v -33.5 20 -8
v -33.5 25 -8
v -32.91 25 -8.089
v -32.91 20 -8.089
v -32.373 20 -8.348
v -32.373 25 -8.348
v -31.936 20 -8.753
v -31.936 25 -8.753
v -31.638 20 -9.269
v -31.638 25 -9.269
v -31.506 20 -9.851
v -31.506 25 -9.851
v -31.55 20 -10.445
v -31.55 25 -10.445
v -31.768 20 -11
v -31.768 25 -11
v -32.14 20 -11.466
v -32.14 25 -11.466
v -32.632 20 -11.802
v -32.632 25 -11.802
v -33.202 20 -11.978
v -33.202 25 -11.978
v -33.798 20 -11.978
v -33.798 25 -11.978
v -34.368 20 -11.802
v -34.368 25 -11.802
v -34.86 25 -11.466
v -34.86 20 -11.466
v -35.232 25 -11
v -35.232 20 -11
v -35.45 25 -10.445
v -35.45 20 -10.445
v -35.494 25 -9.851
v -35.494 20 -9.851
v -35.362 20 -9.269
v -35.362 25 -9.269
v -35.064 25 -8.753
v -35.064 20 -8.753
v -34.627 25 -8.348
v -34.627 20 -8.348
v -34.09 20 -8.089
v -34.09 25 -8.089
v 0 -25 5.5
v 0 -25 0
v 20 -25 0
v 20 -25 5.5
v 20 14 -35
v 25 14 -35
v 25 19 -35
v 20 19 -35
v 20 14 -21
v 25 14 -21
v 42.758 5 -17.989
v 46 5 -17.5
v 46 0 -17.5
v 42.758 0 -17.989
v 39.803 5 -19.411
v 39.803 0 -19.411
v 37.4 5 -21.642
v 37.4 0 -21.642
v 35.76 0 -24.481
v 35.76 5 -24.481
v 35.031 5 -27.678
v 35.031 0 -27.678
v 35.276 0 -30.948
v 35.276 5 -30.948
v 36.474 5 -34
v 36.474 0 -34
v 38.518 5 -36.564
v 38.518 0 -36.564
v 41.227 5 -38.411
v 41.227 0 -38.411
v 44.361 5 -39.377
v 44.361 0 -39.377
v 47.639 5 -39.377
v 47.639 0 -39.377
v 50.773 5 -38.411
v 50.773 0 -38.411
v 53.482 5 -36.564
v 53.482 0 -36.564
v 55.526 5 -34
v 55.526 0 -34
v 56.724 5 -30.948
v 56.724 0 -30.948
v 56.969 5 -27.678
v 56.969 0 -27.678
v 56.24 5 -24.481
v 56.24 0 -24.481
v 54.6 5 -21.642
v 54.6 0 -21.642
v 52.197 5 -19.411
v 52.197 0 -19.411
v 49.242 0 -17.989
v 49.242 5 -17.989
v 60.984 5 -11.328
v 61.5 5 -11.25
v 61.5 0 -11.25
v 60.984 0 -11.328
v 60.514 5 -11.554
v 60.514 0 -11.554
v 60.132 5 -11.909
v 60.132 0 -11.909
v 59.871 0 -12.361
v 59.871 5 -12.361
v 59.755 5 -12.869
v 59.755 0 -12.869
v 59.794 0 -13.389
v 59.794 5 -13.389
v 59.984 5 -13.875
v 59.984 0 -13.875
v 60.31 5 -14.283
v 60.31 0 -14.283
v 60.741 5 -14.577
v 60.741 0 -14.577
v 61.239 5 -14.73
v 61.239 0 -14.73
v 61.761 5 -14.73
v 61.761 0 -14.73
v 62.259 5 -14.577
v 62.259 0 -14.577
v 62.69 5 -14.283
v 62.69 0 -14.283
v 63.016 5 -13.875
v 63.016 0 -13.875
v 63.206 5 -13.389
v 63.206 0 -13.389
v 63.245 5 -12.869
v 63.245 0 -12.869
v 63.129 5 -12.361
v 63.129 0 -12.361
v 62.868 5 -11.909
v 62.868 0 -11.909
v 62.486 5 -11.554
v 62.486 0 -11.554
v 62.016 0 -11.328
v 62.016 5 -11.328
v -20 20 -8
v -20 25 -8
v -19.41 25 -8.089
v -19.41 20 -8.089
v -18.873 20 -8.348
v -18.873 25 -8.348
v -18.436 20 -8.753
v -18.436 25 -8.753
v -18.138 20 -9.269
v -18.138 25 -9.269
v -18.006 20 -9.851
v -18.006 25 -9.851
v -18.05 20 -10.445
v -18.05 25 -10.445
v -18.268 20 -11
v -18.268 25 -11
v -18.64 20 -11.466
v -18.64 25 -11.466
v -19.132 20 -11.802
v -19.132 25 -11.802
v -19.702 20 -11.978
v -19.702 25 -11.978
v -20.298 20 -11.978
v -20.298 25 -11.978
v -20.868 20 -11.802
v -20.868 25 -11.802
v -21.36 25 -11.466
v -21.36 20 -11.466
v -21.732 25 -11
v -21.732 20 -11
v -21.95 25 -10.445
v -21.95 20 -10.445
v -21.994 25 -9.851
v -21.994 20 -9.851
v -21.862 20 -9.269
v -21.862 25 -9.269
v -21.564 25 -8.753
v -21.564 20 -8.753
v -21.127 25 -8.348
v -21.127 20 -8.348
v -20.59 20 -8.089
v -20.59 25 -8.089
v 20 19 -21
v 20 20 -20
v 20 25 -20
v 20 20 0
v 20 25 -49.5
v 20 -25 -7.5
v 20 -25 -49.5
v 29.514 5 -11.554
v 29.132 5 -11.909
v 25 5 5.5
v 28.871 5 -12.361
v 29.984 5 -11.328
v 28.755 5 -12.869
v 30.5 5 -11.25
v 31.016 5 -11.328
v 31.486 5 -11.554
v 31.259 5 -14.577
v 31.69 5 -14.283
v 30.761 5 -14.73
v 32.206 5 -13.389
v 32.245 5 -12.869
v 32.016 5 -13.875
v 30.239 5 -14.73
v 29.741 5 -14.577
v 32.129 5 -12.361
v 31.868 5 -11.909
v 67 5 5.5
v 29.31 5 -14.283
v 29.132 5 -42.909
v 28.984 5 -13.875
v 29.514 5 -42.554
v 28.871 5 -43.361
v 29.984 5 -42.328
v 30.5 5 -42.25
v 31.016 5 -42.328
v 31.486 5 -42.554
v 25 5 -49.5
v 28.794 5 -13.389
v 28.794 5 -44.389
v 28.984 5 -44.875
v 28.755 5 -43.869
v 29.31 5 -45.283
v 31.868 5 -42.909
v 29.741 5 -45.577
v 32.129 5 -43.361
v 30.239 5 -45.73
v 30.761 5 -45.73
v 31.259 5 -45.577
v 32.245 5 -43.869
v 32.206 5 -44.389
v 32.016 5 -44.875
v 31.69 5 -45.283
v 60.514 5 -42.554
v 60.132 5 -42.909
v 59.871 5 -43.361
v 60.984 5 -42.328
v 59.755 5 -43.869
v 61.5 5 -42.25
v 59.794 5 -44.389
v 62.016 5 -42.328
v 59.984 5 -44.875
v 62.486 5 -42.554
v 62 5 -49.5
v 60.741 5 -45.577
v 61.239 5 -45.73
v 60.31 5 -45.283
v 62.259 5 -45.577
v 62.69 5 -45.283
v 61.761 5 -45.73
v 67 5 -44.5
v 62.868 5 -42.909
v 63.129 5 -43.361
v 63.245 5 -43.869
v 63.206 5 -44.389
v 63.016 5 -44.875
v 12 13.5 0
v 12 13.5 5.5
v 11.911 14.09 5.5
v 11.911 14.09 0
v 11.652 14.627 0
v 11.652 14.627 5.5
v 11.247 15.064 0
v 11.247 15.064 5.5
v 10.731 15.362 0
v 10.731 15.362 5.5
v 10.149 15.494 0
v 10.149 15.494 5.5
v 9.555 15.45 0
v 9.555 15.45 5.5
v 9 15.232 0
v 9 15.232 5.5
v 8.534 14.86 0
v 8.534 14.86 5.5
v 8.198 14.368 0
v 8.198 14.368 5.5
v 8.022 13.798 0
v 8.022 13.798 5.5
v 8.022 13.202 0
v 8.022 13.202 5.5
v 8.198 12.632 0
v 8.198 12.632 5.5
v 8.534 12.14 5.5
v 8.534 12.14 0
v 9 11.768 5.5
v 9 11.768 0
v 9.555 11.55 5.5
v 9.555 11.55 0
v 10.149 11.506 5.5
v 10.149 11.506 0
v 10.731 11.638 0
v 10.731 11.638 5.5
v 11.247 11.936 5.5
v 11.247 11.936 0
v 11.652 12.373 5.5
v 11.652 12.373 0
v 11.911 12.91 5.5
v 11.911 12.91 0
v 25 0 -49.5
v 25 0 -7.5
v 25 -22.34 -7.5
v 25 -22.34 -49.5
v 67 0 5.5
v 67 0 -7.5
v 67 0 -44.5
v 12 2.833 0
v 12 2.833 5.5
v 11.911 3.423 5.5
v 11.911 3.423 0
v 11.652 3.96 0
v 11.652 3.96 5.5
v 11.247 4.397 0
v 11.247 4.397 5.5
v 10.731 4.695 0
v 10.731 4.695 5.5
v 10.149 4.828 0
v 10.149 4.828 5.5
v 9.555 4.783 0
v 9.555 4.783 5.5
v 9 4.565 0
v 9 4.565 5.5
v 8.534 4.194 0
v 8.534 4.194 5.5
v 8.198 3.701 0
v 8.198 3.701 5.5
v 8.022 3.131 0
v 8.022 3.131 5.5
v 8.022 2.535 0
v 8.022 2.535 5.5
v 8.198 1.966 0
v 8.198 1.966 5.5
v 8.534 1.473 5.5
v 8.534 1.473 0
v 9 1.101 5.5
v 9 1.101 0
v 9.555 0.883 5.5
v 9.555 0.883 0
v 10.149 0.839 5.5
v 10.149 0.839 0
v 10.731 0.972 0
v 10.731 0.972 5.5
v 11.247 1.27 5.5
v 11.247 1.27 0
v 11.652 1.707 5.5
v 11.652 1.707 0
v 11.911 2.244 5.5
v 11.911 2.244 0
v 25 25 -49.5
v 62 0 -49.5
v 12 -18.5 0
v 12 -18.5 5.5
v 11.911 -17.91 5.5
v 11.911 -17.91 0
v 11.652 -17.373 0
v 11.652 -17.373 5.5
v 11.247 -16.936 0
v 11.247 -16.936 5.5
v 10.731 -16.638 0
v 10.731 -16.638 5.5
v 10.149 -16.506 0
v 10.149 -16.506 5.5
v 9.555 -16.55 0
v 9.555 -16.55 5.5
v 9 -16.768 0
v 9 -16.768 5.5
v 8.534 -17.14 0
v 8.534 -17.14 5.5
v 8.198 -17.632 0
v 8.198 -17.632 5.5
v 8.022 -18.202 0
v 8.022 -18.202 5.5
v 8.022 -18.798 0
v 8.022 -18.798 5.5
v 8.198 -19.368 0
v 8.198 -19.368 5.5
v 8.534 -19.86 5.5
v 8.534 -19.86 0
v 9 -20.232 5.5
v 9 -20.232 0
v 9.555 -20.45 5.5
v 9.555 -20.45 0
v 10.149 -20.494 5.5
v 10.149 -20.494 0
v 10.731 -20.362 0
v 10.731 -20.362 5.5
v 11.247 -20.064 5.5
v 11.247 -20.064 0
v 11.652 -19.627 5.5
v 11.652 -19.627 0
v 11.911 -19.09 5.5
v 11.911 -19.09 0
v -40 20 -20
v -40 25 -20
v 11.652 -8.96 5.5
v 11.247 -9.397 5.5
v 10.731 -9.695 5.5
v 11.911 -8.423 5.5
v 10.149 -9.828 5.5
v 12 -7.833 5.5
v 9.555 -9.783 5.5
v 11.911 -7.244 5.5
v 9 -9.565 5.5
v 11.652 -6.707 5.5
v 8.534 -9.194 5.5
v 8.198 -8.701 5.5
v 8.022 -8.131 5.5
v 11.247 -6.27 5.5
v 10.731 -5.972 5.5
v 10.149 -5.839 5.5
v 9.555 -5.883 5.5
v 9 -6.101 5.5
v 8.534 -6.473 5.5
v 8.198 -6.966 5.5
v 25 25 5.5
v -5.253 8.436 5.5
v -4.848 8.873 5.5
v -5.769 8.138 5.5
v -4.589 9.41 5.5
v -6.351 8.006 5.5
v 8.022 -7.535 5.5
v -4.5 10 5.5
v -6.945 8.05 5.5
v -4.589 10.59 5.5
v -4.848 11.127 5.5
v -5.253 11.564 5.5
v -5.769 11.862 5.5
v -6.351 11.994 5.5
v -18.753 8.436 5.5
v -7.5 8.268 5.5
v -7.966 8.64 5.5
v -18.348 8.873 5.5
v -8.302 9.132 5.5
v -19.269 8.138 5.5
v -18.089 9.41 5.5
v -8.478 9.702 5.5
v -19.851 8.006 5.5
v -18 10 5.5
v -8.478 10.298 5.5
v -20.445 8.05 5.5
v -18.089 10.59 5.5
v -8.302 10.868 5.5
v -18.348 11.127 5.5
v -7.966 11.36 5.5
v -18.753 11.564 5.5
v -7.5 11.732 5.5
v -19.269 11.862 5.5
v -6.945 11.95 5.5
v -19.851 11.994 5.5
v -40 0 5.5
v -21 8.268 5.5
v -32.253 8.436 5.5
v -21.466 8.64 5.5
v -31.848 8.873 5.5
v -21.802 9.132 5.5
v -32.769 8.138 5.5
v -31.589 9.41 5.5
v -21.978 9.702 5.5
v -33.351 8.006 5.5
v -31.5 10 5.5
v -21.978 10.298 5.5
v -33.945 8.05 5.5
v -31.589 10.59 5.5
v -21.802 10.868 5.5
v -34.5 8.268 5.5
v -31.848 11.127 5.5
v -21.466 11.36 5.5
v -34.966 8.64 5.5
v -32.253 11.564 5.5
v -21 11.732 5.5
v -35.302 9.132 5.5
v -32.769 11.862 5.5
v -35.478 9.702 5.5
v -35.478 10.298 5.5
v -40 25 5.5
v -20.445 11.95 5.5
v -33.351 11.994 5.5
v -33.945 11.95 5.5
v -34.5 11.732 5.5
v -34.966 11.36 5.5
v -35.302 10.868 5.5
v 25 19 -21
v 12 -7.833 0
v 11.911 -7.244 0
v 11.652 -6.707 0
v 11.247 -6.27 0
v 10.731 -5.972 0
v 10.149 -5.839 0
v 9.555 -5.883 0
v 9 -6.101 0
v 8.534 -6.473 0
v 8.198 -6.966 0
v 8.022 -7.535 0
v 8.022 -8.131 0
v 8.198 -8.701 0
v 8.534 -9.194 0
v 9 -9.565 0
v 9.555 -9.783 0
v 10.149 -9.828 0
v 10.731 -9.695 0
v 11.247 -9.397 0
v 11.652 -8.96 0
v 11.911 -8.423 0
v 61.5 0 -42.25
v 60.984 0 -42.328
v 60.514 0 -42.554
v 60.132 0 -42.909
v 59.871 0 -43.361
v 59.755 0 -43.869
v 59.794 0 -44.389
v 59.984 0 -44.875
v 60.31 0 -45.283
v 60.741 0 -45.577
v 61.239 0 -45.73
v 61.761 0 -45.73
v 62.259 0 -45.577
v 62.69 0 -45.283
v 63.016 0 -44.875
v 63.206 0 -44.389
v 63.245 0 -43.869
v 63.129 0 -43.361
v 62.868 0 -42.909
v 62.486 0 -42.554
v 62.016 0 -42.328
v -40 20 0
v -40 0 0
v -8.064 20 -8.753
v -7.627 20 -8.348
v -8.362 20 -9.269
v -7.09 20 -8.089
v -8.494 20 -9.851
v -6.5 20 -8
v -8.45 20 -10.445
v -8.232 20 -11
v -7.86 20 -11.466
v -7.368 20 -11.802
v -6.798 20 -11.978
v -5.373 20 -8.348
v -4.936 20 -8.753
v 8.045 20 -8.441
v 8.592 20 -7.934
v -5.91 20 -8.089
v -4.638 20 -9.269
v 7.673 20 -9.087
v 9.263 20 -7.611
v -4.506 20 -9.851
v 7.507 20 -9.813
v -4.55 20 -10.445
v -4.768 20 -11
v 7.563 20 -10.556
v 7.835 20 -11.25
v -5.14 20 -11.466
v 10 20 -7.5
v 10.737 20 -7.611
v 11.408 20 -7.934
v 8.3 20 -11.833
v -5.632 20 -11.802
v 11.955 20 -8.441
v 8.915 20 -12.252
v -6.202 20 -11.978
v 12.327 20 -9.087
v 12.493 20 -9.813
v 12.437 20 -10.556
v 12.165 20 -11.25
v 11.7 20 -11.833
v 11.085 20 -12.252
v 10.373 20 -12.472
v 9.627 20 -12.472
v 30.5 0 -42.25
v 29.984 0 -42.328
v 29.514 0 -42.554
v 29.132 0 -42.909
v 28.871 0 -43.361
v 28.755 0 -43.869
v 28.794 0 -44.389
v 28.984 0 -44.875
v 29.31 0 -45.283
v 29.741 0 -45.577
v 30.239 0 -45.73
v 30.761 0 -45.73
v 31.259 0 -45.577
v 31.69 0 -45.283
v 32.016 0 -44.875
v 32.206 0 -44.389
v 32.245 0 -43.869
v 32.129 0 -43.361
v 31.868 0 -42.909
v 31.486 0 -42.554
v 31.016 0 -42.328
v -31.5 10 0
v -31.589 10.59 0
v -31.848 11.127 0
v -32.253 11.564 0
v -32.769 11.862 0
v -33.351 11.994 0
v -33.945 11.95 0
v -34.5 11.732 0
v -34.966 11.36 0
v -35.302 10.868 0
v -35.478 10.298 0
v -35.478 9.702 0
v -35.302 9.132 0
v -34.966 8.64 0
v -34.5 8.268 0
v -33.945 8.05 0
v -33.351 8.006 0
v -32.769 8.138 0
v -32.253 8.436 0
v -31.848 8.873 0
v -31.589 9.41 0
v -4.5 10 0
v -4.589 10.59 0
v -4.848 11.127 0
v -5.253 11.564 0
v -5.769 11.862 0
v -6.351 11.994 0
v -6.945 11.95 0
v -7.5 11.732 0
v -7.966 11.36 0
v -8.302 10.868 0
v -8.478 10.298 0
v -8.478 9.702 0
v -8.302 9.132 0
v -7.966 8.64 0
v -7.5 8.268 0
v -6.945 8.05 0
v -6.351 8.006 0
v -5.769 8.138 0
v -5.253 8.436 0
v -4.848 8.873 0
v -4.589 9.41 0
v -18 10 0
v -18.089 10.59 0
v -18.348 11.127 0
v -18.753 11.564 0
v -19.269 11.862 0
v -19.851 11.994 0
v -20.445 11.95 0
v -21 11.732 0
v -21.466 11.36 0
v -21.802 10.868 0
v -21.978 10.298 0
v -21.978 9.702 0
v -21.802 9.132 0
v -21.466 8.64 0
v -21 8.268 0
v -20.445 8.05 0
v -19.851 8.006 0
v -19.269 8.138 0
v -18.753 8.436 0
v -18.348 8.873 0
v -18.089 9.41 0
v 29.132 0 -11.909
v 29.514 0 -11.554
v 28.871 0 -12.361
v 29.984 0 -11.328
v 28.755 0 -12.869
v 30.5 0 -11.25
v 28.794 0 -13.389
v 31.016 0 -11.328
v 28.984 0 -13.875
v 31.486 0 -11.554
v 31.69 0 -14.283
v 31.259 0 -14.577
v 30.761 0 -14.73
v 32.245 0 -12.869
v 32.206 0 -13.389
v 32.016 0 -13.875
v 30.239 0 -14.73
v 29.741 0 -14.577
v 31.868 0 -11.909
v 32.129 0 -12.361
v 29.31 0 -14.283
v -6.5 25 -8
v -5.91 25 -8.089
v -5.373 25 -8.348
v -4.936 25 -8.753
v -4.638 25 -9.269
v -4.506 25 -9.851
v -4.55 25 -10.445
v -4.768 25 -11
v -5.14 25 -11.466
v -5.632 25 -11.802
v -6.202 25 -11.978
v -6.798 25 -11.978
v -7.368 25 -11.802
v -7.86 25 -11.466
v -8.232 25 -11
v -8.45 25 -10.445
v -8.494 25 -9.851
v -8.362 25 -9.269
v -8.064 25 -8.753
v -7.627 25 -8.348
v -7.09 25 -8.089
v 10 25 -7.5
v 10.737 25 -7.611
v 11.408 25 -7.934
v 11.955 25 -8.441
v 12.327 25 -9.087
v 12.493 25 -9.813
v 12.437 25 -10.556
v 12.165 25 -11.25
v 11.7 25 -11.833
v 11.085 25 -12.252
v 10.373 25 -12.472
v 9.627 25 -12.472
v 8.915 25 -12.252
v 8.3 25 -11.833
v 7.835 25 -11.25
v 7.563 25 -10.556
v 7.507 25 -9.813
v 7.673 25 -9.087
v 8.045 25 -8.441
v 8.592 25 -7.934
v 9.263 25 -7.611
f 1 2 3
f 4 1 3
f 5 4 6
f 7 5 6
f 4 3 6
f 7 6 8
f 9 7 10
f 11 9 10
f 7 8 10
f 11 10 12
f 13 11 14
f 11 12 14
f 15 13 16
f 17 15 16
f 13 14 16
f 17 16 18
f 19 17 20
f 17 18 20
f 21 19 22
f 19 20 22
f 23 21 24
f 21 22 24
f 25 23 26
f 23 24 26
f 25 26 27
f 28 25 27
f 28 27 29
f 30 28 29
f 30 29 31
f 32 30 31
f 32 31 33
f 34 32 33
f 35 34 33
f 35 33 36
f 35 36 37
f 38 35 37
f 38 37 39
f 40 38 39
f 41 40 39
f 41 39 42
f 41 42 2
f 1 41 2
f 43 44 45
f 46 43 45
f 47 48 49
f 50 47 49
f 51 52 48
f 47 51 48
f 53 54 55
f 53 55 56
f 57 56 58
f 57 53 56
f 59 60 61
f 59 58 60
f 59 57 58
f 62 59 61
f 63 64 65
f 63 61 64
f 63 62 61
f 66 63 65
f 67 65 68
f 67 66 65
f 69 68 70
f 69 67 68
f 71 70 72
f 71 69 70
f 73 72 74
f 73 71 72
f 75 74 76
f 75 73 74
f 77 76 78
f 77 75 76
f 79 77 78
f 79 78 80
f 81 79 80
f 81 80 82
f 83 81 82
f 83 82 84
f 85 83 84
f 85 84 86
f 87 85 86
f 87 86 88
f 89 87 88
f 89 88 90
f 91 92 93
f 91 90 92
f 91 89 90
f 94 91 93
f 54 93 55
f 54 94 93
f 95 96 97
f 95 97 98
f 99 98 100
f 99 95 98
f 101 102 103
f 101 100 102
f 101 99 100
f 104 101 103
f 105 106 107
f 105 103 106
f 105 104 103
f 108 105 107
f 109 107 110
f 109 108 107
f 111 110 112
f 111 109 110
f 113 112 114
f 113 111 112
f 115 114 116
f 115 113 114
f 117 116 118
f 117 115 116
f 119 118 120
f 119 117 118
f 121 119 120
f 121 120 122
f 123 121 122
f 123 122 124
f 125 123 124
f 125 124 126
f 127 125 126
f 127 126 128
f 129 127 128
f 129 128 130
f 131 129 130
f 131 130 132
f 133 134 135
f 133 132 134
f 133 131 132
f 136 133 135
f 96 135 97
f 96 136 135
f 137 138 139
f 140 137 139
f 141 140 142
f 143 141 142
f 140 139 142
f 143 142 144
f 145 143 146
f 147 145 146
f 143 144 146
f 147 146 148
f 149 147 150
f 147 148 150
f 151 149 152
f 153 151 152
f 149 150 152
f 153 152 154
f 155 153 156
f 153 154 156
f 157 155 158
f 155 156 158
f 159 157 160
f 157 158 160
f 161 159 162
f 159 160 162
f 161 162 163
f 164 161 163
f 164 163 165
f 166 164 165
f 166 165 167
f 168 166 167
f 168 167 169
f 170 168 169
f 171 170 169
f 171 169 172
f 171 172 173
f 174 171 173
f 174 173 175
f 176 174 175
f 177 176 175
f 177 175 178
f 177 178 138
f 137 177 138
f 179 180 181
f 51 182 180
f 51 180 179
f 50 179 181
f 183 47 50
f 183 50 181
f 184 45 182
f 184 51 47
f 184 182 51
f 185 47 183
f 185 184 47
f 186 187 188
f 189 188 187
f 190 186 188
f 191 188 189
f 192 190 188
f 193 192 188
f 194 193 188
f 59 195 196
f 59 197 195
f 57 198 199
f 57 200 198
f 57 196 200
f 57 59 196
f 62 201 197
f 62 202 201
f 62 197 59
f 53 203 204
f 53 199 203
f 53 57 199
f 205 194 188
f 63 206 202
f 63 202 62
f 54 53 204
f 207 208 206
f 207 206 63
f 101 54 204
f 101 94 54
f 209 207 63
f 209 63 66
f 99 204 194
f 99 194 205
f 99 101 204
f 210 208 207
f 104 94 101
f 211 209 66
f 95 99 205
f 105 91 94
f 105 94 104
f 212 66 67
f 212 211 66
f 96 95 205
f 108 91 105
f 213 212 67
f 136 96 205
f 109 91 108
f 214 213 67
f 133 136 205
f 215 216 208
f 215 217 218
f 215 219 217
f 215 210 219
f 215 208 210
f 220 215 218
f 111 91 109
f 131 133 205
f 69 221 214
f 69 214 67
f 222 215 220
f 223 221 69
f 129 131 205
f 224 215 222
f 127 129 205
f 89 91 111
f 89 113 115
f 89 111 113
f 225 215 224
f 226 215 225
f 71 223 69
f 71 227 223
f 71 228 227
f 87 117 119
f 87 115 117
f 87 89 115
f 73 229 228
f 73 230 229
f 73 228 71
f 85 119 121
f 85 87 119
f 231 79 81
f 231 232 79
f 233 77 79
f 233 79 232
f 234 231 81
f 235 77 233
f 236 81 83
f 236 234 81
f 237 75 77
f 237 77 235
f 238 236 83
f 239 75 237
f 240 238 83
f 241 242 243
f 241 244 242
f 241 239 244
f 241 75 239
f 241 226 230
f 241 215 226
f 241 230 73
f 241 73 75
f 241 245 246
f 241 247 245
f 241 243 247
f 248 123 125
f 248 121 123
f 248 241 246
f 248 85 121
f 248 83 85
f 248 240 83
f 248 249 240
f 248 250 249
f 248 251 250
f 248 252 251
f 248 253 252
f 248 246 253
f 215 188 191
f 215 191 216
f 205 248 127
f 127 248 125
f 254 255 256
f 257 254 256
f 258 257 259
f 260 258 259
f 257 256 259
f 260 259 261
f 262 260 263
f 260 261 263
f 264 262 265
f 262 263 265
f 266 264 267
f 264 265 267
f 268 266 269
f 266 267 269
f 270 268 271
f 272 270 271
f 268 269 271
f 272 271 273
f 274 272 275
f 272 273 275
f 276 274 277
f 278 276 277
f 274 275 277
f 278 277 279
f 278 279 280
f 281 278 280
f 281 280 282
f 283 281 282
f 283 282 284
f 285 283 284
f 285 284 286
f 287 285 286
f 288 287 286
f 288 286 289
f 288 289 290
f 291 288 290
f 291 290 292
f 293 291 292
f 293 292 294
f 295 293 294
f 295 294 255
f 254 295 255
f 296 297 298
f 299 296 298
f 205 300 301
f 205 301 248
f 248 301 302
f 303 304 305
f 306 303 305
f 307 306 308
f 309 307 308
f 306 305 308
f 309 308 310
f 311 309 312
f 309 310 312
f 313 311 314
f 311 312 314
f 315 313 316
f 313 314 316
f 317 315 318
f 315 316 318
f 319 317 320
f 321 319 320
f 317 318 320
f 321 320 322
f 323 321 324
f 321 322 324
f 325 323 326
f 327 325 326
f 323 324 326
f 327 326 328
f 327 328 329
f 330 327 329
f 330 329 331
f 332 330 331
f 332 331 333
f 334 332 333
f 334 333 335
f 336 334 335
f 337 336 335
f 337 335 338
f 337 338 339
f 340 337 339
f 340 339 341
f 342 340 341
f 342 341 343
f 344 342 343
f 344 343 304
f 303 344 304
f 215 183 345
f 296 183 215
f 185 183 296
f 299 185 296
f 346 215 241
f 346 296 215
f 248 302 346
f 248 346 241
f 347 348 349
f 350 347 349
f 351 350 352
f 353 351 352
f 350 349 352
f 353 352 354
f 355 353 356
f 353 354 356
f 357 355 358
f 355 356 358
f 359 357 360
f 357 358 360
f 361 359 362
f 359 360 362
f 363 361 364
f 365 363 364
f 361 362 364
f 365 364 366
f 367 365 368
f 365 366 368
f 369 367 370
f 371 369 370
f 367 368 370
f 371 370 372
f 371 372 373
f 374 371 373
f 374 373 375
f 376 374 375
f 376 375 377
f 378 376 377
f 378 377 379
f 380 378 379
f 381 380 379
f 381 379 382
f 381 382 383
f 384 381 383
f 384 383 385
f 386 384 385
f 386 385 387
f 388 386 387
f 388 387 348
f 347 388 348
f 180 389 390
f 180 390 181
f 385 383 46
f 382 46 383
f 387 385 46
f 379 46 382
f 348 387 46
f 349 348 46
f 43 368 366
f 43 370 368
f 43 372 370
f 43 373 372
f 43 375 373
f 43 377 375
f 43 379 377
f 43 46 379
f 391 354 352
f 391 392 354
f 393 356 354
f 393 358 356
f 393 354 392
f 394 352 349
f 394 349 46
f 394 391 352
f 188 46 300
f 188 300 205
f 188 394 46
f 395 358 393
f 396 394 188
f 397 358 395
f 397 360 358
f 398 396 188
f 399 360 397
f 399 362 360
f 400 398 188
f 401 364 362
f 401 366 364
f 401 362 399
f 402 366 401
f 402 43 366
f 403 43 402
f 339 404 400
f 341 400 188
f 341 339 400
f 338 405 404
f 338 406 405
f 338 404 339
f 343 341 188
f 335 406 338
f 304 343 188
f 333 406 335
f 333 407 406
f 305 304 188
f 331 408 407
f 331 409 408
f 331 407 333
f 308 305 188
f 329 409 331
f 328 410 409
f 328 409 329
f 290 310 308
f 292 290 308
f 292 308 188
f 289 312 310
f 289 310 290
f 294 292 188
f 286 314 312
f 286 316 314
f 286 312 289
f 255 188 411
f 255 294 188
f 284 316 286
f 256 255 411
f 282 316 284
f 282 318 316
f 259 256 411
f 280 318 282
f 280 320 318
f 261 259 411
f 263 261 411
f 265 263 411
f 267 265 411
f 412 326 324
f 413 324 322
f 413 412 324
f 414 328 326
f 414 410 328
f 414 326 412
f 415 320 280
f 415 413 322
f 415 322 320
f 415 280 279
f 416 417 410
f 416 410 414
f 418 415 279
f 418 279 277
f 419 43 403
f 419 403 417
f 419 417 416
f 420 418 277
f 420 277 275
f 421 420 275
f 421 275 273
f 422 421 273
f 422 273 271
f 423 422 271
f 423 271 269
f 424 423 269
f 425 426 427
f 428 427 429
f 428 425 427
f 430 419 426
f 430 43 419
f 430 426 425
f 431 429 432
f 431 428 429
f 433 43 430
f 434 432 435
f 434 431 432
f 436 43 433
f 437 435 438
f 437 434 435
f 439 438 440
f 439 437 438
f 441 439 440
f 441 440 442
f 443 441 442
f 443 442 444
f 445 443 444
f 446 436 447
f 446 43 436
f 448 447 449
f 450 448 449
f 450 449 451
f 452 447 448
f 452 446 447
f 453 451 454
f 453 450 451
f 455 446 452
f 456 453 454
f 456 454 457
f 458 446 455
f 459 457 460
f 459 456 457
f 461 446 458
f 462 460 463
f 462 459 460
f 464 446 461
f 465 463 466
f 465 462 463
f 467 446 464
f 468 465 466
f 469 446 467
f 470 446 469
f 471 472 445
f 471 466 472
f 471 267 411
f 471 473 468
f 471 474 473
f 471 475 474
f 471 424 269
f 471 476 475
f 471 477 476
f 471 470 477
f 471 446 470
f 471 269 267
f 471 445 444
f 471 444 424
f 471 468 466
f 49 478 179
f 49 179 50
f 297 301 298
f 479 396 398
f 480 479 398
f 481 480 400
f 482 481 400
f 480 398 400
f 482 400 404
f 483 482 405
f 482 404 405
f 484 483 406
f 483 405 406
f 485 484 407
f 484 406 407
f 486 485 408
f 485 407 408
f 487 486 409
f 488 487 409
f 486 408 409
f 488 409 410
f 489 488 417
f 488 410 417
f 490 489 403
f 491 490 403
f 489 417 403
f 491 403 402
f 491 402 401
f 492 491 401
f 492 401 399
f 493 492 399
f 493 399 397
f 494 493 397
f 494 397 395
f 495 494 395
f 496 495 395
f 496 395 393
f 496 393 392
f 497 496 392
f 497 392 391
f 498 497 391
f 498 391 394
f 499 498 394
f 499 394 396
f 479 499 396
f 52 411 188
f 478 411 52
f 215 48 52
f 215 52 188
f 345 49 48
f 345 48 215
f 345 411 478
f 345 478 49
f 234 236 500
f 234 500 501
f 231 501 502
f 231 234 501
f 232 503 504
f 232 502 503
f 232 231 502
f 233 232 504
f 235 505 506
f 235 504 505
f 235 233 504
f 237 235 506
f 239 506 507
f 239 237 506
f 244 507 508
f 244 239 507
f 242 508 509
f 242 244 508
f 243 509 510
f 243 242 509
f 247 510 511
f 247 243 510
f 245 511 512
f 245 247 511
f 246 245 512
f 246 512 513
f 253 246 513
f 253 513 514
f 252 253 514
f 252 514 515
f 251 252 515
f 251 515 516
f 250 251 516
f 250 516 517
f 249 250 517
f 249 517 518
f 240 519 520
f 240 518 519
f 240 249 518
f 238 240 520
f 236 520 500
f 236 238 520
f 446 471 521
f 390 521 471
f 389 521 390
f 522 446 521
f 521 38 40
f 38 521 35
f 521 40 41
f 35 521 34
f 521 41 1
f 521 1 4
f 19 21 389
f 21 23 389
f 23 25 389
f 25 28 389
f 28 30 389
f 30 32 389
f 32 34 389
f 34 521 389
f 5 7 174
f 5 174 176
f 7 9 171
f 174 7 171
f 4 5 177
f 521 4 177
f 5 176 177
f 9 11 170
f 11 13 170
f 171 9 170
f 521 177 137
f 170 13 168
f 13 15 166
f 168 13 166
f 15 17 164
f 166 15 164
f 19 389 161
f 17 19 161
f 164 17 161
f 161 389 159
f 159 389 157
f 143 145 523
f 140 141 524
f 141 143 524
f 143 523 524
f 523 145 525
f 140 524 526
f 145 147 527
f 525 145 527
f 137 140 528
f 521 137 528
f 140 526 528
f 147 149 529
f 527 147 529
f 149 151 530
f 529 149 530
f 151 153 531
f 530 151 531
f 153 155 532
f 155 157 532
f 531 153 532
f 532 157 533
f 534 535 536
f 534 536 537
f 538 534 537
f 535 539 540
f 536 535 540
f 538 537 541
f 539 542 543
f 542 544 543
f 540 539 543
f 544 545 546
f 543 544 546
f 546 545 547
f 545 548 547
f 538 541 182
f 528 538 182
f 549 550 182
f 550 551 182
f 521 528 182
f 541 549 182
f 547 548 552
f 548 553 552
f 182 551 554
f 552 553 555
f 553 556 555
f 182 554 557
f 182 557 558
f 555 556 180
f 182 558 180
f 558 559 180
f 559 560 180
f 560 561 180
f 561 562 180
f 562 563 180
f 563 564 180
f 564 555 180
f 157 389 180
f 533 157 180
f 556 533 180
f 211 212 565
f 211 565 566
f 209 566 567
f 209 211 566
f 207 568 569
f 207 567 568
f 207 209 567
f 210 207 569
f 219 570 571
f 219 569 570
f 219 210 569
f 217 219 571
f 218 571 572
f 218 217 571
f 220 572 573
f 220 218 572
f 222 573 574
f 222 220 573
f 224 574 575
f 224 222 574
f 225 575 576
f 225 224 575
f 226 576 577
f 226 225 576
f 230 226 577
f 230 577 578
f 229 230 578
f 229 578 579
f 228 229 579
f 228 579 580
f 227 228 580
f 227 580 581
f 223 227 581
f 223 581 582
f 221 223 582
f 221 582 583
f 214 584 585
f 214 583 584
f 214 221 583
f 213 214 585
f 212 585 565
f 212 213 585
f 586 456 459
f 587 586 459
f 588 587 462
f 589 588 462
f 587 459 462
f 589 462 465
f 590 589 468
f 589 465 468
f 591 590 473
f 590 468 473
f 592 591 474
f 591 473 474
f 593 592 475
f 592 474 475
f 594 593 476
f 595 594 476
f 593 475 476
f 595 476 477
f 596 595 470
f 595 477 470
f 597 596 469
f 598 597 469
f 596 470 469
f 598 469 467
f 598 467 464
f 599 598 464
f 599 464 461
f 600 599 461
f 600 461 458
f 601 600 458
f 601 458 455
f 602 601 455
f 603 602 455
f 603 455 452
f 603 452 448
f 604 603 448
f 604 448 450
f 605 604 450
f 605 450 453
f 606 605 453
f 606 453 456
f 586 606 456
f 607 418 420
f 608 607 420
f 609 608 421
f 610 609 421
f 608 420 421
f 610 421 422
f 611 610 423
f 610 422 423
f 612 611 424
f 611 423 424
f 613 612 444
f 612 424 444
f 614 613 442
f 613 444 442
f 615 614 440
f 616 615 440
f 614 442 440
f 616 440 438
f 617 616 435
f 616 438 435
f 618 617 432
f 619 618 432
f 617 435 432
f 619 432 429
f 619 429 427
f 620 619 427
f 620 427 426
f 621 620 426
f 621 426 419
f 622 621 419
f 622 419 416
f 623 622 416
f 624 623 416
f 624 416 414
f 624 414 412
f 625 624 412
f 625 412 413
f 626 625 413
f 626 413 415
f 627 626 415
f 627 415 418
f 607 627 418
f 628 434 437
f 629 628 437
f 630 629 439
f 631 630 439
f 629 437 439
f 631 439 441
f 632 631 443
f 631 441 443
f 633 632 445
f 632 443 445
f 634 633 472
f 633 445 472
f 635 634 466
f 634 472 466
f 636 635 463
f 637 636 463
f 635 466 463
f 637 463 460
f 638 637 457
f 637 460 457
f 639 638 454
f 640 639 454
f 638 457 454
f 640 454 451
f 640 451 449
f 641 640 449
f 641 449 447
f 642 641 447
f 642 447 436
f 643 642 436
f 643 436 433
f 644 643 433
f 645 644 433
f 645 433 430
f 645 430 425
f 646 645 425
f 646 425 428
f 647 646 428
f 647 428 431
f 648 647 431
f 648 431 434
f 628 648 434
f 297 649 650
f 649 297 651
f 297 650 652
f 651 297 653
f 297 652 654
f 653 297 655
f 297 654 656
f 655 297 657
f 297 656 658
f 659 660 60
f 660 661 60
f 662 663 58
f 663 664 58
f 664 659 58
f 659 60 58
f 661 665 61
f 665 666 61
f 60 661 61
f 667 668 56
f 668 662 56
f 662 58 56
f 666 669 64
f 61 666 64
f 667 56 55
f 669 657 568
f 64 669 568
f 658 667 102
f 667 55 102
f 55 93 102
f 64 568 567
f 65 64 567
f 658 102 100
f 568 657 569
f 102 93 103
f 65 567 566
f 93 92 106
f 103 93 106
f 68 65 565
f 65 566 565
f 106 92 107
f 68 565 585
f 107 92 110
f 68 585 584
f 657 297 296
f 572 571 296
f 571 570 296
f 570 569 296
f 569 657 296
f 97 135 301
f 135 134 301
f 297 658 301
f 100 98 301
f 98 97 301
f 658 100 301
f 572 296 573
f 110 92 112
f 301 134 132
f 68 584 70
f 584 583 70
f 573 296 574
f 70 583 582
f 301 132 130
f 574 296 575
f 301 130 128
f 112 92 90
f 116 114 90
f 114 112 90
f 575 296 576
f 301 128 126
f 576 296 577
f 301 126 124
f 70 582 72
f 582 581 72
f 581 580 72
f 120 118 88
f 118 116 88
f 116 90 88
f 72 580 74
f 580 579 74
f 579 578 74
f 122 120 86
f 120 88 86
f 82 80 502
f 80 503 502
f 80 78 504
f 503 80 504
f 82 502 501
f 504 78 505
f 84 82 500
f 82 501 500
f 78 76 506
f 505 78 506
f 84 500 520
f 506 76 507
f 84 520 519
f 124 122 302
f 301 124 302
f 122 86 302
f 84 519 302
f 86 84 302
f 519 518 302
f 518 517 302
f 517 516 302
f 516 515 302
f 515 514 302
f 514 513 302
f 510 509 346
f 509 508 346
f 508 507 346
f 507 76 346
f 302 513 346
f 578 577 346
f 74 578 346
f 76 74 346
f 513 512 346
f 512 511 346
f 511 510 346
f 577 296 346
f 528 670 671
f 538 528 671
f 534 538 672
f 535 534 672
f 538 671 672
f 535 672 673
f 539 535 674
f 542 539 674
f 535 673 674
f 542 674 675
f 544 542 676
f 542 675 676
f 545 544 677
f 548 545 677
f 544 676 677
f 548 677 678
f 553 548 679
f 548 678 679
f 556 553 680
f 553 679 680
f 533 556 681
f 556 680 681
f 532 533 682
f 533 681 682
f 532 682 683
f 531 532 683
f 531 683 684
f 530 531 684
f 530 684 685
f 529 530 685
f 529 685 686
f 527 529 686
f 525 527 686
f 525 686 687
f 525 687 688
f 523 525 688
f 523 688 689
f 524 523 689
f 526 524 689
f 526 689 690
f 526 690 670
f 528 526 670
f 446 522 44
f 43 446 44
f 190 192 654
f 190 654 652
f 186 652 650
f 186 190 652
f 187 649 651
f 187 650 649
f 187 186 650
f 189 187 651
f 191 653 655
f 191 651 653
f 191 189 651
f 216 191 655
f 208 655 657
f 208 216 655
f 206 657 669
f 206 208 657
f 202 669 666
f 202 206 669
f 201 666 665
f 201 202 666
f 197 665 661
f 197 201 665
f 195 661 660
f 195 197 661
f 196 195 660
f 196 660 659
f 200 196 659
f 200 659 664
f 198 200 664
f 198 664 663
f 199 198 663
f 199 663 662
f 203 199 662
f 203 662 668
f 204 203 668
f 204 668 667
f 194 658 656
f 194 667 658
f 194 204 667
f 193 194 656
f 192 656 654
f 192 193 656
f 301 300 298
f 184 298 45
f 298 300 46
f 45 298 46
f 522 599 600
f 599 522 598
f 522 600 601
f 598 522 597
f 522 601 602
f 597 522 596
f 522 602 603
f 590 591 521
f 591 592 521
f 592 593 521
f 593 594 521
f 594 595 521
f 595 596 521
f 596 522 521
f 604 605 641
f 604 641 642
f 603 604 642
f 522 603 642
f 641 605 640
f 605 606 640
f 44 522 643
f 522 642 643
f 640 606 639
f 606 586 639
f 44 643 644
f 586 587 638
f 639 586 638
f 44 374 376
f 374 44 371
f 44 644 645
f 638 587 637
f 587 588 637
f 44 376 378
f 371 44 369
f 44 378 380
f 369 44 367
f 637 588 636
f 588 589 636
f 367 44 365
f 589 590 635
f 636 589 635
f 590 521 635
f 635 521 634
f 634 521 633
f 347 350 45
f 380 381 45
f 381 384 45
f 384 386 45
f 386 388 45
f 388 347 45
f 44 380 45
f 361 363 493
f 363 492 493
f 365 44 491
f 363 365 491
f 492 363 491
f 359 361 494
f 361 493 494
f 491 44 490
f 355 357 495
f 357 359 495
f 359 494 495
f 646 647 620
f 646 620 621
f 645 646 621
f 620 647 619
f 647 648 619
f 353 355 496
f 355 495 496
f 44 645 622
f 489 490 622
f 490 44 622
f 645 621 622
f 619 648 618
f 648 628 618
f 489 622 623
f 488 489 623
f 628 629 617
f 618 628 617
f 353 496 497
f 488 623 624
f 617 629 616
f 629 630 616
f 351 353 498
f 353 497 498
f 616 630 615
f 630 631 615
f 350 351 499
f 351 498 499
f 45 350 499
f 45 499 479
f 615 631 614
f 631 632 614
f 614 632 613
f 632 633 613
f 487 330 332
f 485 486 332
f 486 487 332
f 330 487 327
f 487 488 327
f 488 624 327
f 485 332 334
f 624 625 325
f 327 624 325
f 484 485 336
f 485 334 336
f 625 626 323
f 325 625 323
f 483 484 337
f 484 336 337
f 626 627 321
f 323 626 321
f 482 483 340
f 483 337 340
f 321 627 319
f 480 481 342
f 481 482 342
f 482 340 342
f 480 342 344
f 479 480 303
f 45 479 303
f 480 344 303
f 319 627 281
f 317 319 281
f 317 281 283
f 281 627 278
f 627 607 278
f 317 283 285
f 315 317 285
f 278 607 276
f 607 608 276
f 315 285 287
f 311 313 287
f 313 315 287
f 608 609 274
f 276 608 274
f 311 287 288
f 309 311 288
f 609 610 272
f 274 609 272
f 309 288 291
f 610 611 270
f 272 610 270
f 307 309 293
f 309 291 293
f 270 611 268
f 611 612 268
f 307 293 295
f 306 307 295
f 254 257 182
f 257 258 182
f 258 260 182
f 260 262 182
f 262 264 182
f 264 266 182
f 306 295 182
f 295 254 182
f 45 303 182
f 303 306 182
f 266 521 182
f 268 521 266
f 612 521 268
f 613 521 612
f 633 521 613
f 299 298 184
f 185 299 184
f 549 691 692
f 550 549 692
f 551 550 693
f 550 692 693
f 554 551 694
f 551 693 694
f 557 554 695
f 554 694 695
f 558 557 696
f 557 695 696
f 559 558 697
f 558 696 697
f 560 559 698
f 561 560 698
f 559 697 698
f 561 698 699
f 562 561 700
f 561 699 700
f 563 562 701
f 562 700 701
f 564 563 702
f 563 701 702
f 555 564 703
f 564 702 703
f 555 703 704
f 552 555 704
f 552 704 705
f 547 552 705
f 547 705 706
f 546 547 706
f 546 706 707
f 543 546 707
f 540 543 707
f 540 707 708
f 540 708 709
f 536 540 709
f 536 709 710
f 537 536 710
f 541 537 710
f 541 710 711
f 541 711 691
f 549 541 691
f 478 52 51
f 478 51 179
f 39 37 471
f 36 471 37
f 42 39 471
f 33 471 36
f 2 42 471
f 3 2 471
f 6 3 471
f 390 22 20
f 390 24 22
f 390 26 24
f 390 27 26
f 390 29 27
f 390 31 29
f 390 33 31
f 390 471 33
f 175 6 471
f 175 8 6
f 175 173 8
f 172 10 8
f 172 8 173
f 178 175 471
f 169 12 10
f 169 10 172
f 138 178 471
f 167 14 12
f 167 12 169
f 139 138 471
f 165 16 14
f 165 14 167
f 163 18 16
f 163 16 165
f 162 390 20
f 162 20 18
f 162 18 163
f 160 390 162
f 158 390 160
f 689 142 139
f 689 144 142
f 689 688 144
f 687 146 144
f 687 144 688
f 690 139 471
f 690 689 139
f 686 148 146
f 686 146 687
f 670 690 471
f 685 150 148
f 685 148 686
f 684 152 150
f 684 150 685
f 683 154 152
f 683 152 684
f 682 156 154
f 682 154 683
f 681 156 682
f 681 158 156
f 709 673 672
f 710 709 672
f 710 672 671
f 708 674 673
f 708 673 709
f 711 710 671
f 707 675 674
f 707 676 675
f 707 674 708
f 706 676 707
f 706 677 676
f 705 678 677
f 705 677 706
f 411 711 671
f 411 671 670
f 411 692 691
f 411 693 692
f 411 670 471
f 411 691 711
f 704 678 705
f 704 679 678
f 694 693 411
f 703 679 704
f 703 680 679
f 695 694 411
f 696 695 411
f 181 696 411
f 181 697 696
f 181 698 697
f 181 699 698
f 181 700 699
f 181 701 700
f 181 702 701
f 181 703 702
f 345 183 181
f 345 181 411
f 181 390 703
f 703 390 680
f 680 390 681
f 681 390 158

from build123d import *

# Parameters (mm, degrees)
BOSS_EXTRUDE1_DEPTH     = 5.5
SKETCH2_W               = 65
SKETCH2_H               = 25.5
BOSS_EXTRUDE2_DEPTH     = 5
SKETCH3_W               = 55
SKETCH3_H               = 25
BOSS_EXTRUDE3_DEPTH     = 5
SKETCH4_W               = 42
SKETCH4_H               = 55
BOSS_EXTRUDE4_DEPTH     = 5
BOSS_EXTRUDE6_DEPTH     = 7.5
BOSS_EXTRUDE7_DEPTH     = 42
SKETCH7_W               = 5
SKETCH7_H               = 29.5
BOSS_EXTRUDE8_DEPTH     = 5
SKETCH8_W               = 55
SKETCH8_H               = 20
CUT_EXTRUDE1_DEPTH      = 5
SKETCH9_R               = 2.5
SKETCH9_R_2             = 2
CUT_EXTRUDE2_DEPTH      = 98.155802709
SKETCH10_R              = 2
CUT_EXTRUDE3_DEPTH      = 91.21640649
CUT_EXTRUDE4_DEPTH      = 87.972696865
CUT_EXTRUDE4_DEPTH_BACK = 87.972696865
SKETCH11_R              = 1.75
SKETCH11_R_2            = 11
CHAMFER1_SIZE           = 5
SKETCH12_W              = 14
SKETCH12_H              = 5
CUT_EXTRUDE5_DEPTH      = 10


with BuildPart() as part:
    # Sketch1 → Boss-Extrude1 (new body)
    with BuildSketch(Plane.XY):
        Polygon((-40, 20), (-40, 0), (0, -25), (20, -25), (67, 0), (25, 0), (25, 20), align=None)
    extrude(amount=BOSS_EXTRUDE1_DEPTH)

    # Sketch2 → Boss-Extrude2 (add)
    with BuildSketch(Plane(origin=(0, 20, 0), x_dir=(1, 0, 0), z_dir=(0, 1, 0))):
        with Locations((-7.5, 7.25)):
            Rectangle(SKETCH2_W, SKETCH2_H)
    extrude(amount=BOSS_EXTRUDE2_DEPTH)

    # Sketch3 → Boss-Extrude3 (add)
    with BuildSketch(Plane(origin=(25, 0, 0), x_dir=(0, 0, -1), z_dir=(1, 0, 0))):
        with Locations((22, 12.5)):
            Rectangle(SKETCH3_W, SKETCH3_H)
    extrude(amount=BOSS_EXTRUDE3_DEPTH)

    # Sketch4 → Boss-Extrude4 (add)
    with BuildSketch(Plane(origin=(0, 0, 0), x_dir=(1, 0, 0), z_dir=(0, 1, 0))):
        with Locations((46, 22)):
            Rectangle(SKETCH4_W, SKETCH4_H)
    extrude(amount=BOSS_EXTRUDE4_DEPTH)

    # Sketch5 → Boss-Extrude6 (add)
    with BuildSketch(Plane(origin=(0, 0, 0), x_dir=(-1, 0, 0), z_dir=(0, 0, -1))):
        Polygon((-20, -25), (-20, 20), (-25, 20), (-25, 0), (-67, 0), align=None)
    extrude(amount=BOSS_EXTRUDE6_DEPTH)

    # Sketch6 → Boss-Extrude7 (add)
    with BuildSketch(Plane(origin=(0, 0, -7.5), x_dir=(-1, 0, 0), z_dir=(0, 0, -1))):
        Polygon((-25, 0), (-25, -22.340425532), (-20, -25), (-20, 20), (-25, 20), align=None)
    extrude(amount=BOSS_EXTRUDE7_DEPTH)

    # Sketch7 → Boss-Extrude8 (add)
    with BuildSketch(Plane(origin=(0, 20, 0), x_dir=(1, 0, 0), z_dir=(0, 1, 0))):
        with Locations((22.5, 34.75)):
            Rectangle(SKETCH7_W, SKETCH7_H)
    extrude(amount=BOSS_EXTRUDE8_DEPTH)

    # Sketch8 → Cut-Extrude1 (cut)
    with BuildSketch(Plane(origin=(30, 0, 0), x_dir=(0, 0, -1), z_dir=(1, 0, 0))):
        with Locations((22, 15)):
            Rectangle(SKETCH8_W, SKETCH8_H)
    extrude(amount=-CUT_EXTRUDE1_DEPTH, mode=Mode.SUBTRACT)

    # Sketch9 → Cut-Extrude2 (cut, through all)
    with BuildSketch(Plane(origin=(0, 25, 0), x_dir=(1, 0, 0), z_dir=(0, 1, 0))):
        with Locations(Location((10, 10, 0), (0, 0, 270))):
            Circle(SKETCH9_R)
        with Locations(Location((-33.5, 10, 0), (0, 0, 270))):
            Circle(SKETCH9_R_2)
        with Locations(Location((-20, 10, 0), (0, 0, 270))):
            Circle(SKETCH9_R_2)
        with Locations(Location((-6.5, 10, 0), (0, 0, 270))):
            Circle(SKETCH9_R_2)
    extrude(amount=-CUT_EXTRUDE2_DEPTH, mode=Mode.SUBTRACT)

    # Sketch10 → Cut-Extrude3 (cut, through all)
    with BuildSketch(Plane.XY.offset(5.5)):
        with Locations((-33.5, 10)):
            Circle(SKETCH10_R)
        with Locations((-20, 10)):
            Circle(SKETCH10_R)
        with Locations((-6.5, 10)):
            Circle(SKETCH10_R)
        with Locations((10, -18.5)):
            Circle(SKETCH10_R)
        with Locations((10, -7.833333333)):
            Circle(SKETCH10_R)
        with Locations((10, 2.833333333)):
            Circle(SKETCH10_R)
        with Locations((10, 13.5)):
            Circle(SKETCH10_R)
    extrude(amount=-CUT_EXTRUDE3_DEPTH, mode=Mode.SUBTRACT)

    # Sketch11 → Cut-Extrude4 (cut, two sides: drawn at the far end of the back side and taken through both)
    with BuildSketch(Plane.XZ.offset(-CUT_EXTRUDE4_DEPTH_BACK)):
        with Locations(Location((61.5, -44, 0), (0, 0, 90))):
            Circle(SKETCH11_R)
        with Locations(Location((61.5, -13, 0), (0, 0, 90))):
            Circle(SKETCH11_R)
        with Locations(Location((30.5, -13, 0), (0, 0, 90))):
            Circle(SKETCH11_R)
        with Locations(Location((30.5, -44, 0), (0, 0, 90))):
            Circle(SKETCH11_R)
        with Locations(Location((46, -28.5, 0), (0, 0, 90))):
            Circle(SKETCH11_R_2)
    extrude(amount=CUT_EXTRUDE4_DEPTH + CUT_EXTRUDE4_DEPTH_BACK, mode=Mode.SUBTRACT)

    # Chamfer1
    chamfer1_edges = [part.edges().sort_by_distance(p)[0] for p in [
        (67, 2.5, -49.5),
    ]]
    chamfer(chamfer1_edges, length=CHAMFER1_SIZE)

    # Sketch12 → Cut-Extrude5 (cut)
    with BuildSketch(Plane(origin=(25, 0, 0), x_dir=(0, 0, -1), z_dir=(1, 0, 0))):
        with Locations((28, 16.5)):
            Rectangle(SKETCH12_W, SKETCH12_H)
    extrude(amount=-CUT_EXTRUDE5_DEPTH, mode=Mode.SUBTRACT)


solid = part.part
